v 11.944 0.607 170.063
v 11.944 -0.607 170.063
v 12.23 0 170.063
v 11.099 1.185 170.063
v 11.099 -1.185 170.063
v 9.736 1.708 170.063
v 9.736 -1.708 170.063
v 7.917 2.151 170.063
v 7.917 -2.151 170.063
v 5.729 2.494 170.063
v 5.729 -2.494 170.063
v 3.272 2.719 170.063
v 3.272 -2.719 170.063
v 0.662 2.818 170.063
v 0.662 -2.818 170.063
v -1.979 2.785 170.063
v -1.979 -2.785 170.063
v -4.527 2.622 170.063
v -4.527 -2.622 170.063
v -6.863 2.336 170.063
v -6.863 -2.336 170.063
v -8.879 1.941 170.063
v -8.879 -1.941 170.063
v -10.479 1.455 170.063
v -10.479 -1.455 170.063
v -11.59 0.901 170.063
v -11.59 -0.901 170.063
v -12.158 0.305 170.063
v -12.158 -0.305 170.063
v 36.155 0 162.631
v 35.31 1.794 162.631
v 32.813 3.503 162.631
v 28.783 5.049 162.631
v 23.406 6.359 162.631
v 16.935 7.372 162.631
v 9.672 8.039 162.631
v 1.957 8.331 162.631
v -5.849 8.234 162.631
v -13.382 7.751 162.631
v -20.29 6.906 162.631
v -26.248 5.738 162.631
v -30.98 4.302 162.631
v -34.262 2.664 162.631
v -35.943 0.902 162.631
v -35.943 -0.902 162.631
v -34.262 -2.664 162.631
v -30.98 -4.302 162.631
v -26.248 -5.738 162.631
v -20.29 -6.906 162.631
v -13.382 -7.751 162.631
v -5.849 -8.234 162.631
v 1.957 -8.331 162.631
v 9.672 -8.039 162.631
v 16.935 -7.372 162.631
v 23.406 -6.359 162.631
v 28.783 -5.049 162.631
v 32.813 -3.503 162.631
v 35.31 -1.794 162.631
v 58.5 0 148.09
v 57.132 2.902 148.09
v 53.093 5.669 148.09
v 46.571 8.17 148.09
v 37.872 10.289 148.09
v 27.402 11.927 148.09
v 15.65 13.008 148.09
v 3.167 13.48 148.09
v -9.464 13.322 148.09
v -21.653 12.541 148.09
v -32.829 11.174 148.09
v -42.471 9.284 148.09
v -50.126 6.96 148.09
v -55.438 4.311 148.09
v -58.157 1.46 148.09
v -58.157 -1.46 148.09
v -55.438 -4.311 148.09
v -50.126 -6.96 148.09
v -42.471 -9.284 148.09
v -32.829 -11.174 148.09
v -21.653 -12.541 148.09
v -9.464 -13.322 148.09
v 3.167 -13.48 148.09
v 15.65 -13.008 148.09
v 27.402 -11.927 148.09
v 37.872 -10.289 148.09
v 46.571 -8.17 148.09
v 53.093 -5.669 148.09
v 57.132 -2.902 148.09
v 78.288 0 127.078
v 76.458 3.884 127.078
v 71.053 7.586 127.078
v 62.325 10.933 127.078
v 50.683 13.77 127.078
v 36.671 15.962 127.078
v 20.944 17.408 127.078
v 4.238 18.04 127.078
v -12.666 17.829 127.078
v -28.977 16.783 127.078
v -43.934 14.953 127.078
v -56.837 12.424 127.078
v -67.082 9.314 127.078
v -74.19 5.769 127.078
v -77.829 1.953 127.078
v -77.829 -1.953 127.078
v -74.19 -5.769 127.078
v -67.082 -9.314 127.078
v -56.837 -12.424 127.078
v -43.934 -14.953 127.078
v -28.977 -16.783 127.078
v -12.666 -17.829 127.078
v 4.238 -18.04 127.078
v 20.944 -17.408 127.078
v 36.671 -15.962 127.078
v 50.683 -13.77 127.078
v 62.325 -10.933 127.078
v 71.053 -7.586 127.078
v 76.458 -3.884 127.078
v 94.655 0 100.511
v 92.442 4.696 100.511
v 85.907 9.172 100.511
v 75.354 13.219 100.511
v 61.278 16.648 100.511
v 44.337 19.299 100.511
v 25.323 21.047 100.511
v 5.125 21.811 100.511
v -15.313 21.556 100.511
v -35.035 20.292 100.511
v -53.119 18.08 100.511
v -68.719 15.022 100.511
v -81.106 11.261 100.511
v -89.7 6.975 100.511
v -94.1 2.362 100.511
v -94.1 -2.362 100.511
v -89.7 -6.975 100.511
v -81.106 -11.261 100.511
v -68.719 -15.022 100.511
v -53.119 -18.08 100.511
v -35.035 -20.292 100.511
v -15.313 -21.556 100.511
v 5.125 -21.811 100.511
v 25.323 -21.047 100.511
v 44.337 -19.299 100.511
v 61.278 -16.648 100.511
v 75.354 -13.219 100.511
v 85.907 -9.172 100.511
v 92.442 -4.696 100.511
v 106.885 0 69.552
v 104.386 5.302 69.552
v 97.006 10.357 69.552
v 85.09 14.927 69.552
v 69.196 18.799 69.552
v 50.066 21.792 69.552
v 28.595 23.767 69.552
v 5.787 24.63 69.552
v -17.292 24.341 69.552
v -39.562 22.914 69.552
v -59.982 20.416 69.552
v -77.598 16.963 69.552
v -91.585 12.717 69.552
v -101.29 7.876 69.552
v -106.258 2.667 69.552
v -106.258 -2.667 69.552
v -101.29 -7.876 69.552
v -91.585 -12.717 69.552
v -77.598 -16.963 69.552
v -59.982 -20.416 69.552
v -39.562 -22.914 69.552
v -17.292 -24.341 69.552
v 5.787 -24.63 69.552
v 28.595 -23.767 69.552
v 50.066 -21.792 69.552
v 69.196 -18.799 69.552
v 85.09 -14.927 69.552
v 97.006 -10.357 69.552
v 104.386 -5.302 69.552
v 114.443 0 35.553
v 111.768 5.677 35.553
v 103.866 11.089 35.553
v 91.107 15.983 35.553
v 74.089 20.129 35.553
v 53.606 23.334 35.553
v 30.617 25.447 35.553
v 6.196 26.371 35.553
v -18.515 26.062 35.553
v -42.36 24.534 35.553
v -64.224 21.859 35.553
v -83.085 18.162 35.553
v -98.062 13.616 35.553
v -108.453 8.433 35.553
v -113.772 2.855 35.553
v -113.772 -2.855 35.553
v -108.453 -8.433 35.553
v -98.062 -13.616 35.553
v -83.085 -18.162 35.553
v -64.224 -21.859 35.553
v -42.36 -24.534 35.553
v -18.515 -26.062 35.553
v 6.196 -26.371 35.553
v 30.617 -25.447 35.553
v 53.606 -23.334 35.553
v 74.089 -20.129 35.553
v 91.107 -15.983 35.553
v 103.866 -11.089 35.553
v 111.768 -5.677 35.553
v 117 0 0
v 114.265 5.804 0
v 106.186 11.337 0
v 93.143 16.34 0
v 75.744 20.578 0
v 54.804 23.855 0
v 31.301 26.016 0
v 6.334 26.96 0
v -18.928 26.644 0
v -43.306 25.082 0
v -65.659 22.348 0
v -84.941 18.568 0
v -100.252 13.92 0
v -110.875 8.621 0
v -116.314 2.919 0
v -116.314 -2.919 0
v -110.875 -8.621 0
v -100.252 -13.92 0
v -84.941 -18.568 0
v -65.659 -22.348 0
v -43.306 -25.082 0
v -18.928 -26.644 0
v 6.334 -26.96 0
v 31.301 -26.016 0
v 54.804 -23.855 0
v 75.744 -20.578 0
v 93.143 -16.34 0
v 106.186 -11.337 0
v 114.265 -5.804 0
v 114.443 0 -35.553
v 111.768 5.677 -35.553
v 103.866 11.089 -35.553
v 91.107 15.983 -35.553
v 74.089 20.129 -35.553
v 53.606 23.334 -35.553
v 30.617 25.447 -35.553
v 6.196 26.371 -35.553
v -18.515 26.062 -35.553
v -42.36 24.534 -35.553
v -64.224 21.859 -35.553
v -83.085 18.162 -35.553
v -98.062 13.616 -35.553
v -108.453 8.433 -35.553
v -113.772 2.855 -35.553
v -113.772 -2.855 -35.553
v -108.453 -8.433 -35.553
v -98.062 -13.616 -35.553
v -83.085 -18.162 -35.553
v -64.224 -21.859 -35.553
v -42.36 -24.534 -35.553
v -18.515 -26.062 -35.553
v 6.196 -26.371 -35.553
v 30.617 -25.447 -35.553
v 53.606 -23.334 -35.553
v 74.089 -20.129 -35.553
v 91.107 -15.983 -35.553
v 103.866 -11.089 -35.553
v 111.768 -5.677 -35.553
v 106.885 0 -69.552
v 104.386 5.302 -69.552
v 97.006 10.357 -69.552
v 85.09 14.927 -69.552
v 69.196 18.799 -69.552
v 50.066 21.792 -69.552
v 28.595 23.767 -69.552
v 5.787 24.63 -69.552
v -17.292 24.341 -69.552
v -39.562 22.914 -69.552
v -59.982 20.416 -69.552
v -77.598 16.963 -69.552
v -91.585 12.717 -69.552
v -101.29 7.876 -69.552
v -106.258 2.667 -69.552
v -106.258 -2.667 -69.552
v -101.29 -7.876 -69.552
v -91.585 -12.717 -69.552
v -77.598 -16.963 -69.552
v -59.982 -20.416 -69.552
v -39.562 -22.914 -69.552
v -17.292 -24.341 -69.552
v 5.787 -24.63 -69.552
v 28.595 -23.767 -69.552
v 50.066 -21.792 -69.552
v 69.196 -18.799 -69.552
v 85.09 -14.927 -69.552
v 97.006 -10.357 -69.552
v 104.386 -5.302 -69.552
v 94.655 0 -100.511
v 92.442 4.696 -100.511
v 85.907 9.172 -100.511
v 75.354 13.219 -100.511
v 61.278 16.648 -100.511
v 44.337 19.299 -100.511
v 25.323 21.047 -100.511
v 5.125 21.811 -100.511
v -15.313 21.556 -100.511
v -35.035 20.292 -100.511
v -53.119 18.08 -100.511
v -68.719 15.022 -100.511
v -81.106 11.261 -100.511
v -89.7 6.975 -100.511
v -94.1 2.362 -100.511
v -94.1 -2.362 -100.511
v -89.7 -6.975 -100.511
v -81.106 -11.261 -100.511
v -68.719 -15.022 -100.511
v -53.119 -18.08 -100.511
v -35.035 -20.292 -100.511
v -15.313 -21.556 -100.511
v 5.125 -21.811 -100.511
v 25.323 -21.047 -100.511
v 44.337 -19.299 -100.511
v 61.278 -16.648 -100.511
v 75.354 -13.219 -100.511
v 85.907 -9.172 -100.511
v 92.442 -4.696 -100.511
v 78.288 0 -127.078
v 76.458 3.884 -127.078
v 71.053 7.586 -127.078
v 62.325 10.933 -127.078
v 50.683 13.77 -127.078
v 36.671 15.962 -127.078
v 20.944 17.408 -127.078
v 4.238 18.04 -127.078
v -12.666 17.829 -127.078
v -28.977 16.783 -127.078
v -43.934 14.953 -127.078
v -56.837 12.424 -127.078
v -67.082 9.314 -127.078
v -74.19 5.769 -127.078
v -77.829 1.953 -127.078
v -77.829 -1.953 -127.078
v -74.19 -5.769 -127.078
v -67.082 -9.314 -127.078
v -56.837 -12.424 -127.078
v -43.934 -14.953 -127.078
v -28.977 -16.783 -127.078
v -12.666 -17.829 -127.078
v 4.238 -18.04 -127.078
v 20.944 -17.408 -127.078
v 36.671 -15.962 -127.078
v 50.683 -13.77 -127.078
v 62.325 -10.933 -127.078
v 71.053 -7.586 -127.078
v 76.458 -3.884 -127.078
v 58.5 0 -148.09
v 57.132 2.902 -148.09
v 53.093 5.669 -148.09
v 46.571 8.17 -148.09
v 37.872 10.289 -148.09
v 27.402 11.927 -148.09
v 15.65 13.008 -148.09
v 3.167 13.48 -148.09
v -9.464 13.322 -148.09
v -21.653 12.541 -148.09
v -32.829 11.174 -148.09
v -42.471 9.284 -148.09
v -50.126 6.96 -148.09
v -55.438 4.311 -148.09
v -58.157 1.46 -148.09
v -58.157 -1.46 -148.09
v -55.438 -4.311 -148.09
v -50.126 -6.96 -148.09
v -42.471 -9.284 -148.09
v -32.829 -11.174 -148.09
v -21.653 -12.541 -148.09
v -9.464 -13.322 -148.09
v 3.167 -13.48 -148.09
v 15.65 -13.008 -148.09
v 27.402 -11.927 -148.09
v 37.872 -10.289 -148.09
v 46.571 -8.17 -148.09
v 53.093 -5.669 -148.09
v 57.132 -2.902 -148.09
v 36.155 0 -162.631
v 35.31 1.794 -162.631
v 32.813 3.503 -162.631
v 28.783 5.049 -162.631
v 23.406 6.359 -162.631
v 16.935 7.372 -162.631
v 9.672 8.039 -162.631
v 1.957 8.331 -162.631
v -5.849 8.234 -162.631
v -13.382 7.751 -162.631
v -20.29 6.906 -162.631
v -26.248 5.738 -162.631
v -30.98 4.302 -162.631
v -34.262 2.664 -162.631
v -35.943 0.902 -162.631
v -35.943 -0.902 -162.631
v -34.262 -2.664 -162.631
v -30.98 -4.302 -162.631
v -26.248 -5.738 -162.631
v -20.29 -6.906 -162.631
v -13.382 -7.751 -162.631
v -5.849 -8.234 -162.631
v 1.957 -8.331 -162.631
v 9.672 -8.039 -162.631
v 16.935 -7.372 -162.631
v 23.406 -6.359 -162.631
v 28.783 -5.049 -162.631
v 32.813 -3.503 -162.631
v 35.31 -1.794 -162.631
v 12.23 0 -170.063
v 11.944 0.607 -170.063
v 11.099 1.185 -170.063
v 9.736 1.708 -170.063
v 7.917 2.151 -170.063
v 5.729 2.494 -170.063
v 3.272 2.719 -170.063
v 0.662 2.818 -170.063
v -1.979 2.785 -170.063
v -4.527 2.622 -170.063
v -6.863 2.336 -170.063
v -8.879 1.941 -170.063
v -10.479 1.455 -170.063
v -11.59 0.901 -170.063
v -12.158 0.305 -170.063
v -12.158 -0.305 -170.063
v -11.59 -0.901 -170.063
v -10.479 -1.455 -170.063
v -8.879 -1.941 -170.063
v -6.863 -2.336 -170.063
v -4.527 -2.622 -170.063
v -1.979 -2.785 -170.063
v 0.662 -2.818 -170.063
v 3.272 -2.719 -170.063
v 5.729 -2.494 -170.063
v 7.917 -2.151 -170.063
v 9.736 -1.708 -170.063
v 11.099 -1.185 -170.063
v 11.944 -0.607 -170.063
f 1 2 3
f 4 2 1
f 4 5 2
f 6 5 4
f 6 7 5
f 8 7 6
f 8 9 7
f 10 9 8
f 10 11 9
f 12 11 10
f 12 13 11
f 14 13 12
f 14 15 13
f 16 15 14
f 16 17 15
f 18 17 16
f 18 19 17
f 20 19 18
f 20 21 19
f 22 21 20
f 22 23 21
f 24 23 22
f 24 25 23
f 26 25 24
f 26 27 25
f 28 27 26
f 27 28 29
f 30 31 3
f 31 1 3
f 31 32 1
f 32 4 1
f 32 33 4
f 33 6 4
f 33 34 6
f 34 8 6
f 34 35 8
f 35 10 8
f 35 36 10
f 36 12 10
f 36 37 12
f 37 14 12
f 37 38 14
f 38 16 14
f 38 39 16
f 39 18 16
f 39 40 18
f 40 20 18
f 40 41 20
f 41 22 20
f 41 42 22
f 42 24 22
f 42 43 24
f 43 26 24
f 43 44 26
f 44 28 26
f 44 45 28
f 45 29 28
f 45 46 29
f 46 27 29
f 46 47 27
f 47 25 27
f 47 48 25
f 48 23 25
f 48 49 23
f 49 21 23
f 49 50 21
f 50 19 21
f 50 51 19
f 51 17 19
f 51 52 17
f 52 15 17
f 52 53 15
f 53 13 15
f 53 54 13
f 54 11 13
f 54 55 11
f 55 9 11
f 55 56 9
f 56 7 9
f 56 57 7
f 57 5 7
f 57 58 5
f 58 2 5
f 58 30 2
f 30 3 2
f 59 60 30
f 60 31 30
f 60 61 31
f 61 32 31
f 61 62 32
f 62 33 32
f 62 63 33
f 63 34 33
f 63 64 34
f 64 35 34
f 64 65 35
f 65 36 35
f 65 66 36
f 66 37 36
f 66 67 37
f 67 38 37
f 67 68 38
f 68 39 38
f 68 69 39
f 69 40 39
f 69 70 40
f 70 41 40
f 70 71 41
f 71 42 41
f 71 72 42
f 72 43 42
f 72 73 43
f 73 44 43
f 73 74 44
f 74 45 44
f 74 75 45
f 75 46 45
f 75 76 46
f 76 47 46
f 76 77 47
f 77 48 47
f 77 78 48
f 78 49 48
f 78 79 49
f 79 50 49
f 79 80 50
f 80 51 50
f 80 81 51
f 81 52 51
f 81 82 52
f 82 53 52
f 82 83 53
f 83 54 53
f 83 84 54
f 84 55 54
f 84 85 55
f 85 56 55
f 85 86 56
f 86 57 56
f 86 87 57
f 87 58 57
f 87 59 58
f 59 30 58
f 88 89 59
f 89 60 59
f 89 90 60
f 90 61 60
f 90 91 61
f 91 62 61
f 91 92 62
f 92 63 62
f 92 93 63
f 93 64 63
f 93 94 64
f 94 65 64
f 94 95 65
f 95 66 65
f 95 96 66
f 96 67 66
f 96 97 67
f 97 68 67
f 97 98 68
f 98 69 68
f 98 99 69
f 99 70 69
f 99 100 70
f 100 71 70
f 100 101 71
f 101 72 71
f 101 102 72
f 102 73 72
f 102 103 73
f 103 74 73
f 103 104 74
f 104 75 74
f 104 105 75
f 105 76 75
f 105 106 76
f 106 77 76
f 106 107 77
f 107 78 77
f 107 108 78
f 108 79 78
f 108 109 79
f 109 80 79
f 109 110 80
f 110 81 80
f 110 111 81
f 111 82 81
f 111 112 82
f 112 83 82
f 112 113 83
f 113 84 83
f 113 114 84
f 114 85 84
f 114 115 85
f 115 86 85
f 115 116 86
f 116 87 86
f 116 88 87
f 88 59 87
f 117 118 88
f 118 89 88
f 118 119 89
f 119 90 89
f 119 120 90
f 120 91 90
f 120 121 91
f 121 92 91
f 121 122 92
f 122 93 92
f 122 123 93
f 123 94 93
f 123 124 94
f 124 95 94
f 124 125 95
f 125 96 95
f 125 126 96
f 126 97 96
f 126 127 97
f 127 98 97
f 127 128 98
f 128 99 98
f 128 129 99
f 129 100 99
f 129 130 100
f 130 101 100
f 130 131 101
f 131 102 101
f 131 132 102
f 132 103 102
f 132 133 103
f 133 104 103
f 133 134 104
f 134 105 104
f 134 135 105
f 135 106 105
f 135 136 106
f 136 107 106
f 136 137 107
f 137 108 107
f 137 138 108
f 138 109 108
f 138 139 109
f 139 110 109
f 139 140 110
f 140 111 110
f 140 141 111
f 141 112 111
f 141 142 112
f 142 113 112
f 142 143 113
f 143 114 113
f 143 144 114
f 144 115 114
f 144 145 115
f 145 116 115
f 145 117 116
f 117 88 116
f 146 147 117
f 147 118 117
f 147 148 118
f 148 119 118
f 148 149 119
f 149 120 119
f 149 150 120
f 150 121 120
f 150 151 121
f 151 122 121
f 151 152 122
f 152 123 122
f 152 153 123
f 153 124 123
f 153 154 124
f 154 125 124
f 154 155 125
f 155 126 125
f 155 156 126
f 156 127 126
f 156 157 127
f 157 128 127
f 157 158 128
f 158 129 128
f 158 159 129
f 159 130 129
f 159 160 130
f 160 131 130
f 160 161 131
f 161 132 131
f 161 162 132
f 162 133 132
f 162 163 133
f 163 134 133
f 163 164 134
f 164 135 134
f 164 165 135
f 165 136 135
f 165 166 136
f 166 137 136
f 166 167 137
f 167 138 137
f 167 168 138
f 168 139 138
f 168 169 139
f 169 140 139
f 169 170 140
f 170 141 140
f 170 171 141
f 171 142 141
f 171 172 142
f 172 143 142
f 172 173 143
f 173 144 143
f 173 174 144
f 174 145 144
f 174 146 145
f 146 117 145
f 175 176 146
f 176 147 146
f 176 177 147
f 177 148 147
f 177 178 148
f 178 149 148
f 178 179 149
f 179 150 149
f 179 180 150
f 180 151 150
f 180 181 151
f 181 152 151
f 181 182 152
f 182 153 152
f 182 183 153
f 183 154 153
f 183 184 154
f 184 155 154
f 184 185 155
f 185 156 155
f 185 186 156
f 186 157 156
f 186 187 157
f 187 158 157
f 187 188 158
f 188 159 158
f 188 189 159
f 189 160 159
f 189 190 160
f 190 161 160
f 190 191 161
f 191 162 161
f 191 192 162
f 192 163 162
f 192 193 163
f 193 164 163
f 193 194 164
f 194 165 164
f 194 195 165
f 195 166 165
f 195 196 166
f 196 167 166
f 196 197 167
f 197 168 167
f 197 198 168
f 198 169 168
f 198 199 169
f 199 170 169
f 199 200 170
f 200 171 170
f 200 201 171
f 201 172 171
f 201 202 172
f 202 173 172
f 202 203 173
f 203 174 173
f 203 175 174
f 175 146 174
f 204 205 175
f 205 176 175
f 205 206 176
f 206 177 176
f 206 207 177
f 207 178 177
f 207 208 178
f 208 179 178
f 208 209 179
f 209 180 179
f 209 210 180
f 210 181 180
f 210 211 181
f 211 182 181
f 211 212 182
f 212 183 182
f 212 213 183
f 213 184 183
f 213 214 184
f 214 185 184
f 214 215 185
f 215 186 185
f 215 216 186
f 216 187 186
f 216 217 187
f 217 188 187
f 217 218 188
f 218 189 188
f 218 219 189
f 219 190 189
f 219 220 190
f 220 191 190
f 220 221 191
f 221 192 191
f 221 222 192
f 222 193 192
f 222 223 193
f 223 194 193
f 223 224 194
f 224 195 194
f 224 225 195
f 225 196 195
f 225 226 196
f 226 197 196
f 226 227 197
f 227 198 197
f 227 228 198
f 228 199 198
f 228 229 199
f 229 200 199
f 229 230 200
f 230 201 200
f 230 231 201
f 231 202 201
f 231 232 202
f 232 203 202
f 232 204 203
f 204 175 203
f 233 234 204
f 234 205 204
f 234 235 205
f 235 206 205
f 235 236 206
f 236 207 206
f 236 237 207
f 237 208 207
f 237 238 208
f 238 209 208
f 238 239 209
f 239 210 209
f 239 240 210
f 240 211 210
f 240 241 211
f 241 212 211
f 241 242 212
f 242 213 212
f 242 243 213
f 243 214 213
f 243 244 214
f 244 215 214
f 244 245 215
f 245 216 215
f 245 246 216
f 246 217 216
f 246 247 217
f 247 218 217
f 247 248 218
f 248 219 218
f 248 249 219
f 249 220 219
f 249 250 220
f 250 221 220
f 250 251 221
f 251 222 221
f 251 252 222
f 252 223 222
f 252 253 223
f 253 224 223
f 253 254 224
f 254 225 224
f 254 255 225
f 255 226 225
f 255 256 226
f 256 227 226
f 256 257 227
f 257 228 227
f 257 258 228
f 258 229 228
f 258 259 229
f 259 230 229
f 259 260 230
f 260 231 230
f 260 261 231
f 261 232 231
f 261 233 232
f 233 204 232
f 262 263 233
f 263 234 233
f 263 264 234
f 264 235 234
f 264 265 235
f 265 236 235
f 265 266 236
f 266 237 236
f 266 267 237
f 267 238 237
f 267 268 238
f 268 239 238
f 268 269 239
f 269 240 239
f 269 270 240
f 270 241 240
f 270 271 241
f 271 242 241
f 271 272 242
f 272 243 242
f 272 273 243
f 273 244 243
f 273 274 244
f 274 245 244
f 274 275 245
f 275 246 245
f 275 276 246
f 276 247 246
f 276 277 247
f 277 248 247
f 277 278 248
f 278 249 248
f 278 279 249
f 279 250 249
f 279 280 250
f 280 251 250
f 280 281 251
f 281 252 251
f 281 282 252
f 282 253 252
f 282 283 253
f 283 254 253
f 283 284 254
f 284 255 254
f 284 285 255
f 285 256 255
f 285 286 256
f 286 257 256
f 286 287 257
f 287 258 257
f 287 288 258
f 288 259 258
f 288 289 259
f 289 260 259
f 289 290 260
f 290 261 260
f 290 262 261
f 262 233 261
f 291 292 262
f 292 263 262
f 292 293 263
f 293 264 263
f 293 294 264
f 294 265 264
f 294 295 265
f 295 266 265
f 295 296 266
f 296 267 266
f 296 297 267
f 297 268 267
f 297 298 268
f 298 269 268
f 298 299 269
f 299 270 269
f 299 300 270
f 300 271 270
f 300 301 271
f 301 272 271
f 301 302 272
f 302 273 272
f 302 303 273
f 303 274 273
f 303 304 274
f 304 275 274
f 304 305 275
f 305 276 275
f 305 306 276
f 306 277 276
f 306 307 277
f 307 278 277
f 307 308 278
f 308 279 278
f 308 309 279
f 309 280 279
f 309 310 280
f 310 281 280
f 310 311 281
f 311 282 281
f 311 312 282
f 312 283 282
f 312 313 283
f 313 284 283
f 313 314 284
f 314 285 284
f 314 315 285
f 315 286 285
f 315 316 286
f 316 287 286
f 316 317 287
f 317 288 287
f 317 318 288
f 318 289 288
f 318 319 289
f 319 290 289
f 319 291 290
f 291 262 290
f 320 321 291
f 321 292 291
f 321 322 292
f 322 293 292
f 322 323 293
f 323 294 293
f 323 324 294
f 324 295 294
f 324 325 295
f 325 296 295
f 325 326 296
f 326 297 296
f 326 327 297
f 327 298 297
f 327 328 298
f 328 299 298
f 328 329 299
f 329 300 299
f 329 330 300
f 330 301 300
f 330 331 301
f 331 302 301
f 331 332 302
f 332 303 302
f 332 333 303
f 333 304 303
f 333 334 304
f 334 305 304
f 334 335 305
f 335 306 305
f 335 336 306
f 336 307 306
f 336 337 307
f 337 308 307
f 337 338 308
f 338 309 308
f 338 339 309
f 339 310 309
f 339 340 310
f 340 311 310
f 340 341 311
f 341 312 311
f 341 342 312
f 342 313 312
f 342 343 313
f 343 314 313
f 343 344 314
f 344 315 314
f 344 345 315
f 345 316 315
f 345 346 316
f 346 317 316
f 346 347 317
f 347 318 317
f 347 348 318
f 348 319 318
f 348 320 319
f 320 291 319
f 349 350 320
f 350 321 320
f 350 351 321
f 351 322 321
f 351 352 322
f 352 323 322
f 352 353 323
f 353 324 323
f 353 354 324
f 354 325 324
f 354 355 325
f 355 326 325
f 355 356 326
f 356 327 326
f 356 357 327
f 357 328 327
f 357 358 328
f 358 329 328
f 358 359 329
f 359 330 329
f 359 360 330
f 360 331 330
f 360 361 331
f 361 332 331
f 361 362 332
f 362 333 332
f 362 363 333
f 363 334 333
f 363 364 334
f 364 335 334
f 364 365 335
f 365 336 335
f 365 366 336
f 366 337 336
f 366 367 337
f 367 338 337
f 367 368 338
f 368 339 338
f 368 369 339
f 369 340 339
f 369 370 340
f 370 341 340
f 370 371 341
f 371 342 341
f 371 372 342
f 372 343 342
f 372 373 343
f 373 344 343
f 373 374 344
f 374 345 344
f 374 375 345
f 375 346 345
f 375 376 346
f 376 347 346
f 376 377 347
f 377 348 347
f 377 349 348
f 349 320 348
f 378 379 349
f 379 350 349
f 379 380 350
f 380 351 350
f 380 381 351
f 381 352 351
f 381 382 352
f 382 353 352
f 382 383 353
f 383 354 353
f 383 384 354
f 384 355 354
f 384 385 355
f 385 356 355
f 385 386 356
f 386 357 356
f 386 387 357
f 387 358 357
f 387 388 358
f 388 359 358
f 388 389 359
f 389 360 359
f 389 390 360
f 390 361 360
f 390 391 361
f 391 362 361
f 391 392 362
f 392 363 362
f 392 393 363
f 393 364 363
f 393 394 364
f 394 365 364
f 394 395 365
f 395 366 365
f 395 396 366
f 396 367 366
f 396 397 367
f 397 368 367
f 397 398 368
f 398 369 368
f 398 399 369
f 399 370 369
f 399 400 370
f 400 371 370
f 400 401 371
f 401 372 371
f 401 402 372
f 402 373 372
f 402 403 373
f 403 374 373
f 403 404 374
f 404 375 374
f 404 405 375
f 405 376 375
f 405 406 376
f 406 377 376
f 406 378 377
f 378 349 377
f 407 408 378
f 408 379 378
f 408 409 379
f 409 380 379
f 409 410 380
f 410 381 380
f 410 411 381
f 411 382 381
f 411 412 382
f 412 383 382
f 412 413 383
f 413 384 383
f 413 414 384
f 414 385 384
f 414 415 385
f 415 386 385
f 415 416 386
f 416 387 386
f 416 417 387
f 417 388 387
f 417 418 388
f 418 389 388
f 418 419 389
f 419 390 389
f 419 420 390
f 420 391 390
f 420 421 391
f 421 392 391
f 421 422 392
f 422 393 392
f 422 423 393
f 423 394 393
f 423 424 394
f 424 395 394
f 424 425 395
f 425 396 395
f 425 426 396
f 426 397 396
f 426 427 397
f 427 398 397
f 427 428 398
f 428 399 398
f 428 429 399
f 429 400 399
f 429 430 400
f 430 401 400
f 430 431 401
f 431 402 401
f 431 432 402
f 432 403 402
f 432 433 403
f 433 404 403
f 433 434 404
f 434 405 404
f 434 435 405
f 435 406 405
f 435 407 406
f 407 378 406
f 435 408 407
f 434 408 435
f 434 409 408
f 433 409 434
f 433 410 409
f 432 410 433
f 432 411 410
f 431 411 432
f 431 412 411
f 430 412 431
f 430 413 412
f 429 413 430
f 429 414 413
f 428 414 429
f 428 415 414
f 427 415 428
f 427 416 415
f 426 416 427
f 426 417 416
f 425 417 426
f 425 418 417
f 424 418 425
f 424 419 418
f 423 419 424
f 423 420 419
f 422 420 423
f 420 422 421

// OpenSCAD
// Generated by SolidPython 1.0.1 on 2020-07-29 00:46:50


scale(v = [13, 3, 19]) {
	sphere(r = 9);
}
/***********************************************
*********      SolidPython code:      **********
************************************************
 
# import packages: SolidPython
from solid import *
from solid.utils import *
from itertools import chain, combinations, permutations


class Resize:

    def __init__(self, scad_file):
        self.scad_file = scad_file
        #self.scad_file = import_scad(scad_file)
        # cone/cylinder param:
        self.r1 = 0
        self.r2 = 0
        self.h = 0
        # rectangular prism param:
        self.w = 0
        self.l = 0
        # ellipse param:
        self.r = 0

    # import OpenScad code (file name corresponds to shape)


    # classify shape + parameters
    def assign(self, param1, param2, param3):
        if self.scad_file == 'cone.scad':
            self.r1 = param1
            self.r2 = param2
            self.h = param3
        elif self.scad_file == 'cylinder.scad':
            self.r1 = param1
            self.r2 = param2
            self.h = param3
        elif self.scad_file == 'rectangularPrism.scad':
            self.h = param1
            self.l = param2
            self.w = param3
        else:
            self.r = param1
            self.h = param2

    # resize parameters
    def iterate(self):
        x = range(3, 20, 2)
        i = 1
        if self.scad_file == 'cone.scad':
            tempList = list(permutations(x, 2))
            for temp in tempList:
                param1 = temp[0]
                param2 = temp[1]
                filepath = 'produced_scad_files/' + 'cone' + str(param1) + '_' + str(param2) + '_' + '.scad'
                scad_render_to_file(cylinder(h=param1, r1=param2, r2=0), filepath)

        elif self.scad_file == 'cylinder.scad':
            tempList = list(permutations(x, 3))
            for temp in tempList:
                param1 = temp[0]
                param2 = temp[1]
                filepath = 'produced_scad_files/' + 'cylinder' + str(param1) + '_' + str(param2) + '_' + '.scad'
                scad_render_to_file(cylinder(h=param1, r1=param2, r2=param2), filepath)

        elif self.scad_file == 'rectangularPrism.scad':
            tempList = list(permutations(x, 3))
            for temp in tempList:
                param1 = temp[0]
                param2 = temp[1]
                param3 = temp[2]
                filepath = 'produced_scad_files/' + 'rectangularPrism' + str(param1) + '_' + str(param2) + '_' + str(
                    param3) + '.scad'
                scad_render_to_file(cube(size=(param1, param2, param3)), filepath)

        elif self.scad_file == 'ellipse.scad':
            tempList = list(permutations(x, 4))
            for temp in tempList:
                param1 = temp[0]
                param2 = temp[1]
                param3 = temp[2]
                param4 = temp[3]
                filepath = 'produced_scad_files/' + 'ellipse' + str(param1) + '_' + str(param2) + '_' + str(param3) + '_' + str(param4) + '.scad'
                scad_render_to_file(scale([param1, param2, param3])(sphere(r=param4)), filepath)

    def render_to_scadfile(self):
        scad_render_to_file(scad, 'example.scad') 
 
************************************************/
